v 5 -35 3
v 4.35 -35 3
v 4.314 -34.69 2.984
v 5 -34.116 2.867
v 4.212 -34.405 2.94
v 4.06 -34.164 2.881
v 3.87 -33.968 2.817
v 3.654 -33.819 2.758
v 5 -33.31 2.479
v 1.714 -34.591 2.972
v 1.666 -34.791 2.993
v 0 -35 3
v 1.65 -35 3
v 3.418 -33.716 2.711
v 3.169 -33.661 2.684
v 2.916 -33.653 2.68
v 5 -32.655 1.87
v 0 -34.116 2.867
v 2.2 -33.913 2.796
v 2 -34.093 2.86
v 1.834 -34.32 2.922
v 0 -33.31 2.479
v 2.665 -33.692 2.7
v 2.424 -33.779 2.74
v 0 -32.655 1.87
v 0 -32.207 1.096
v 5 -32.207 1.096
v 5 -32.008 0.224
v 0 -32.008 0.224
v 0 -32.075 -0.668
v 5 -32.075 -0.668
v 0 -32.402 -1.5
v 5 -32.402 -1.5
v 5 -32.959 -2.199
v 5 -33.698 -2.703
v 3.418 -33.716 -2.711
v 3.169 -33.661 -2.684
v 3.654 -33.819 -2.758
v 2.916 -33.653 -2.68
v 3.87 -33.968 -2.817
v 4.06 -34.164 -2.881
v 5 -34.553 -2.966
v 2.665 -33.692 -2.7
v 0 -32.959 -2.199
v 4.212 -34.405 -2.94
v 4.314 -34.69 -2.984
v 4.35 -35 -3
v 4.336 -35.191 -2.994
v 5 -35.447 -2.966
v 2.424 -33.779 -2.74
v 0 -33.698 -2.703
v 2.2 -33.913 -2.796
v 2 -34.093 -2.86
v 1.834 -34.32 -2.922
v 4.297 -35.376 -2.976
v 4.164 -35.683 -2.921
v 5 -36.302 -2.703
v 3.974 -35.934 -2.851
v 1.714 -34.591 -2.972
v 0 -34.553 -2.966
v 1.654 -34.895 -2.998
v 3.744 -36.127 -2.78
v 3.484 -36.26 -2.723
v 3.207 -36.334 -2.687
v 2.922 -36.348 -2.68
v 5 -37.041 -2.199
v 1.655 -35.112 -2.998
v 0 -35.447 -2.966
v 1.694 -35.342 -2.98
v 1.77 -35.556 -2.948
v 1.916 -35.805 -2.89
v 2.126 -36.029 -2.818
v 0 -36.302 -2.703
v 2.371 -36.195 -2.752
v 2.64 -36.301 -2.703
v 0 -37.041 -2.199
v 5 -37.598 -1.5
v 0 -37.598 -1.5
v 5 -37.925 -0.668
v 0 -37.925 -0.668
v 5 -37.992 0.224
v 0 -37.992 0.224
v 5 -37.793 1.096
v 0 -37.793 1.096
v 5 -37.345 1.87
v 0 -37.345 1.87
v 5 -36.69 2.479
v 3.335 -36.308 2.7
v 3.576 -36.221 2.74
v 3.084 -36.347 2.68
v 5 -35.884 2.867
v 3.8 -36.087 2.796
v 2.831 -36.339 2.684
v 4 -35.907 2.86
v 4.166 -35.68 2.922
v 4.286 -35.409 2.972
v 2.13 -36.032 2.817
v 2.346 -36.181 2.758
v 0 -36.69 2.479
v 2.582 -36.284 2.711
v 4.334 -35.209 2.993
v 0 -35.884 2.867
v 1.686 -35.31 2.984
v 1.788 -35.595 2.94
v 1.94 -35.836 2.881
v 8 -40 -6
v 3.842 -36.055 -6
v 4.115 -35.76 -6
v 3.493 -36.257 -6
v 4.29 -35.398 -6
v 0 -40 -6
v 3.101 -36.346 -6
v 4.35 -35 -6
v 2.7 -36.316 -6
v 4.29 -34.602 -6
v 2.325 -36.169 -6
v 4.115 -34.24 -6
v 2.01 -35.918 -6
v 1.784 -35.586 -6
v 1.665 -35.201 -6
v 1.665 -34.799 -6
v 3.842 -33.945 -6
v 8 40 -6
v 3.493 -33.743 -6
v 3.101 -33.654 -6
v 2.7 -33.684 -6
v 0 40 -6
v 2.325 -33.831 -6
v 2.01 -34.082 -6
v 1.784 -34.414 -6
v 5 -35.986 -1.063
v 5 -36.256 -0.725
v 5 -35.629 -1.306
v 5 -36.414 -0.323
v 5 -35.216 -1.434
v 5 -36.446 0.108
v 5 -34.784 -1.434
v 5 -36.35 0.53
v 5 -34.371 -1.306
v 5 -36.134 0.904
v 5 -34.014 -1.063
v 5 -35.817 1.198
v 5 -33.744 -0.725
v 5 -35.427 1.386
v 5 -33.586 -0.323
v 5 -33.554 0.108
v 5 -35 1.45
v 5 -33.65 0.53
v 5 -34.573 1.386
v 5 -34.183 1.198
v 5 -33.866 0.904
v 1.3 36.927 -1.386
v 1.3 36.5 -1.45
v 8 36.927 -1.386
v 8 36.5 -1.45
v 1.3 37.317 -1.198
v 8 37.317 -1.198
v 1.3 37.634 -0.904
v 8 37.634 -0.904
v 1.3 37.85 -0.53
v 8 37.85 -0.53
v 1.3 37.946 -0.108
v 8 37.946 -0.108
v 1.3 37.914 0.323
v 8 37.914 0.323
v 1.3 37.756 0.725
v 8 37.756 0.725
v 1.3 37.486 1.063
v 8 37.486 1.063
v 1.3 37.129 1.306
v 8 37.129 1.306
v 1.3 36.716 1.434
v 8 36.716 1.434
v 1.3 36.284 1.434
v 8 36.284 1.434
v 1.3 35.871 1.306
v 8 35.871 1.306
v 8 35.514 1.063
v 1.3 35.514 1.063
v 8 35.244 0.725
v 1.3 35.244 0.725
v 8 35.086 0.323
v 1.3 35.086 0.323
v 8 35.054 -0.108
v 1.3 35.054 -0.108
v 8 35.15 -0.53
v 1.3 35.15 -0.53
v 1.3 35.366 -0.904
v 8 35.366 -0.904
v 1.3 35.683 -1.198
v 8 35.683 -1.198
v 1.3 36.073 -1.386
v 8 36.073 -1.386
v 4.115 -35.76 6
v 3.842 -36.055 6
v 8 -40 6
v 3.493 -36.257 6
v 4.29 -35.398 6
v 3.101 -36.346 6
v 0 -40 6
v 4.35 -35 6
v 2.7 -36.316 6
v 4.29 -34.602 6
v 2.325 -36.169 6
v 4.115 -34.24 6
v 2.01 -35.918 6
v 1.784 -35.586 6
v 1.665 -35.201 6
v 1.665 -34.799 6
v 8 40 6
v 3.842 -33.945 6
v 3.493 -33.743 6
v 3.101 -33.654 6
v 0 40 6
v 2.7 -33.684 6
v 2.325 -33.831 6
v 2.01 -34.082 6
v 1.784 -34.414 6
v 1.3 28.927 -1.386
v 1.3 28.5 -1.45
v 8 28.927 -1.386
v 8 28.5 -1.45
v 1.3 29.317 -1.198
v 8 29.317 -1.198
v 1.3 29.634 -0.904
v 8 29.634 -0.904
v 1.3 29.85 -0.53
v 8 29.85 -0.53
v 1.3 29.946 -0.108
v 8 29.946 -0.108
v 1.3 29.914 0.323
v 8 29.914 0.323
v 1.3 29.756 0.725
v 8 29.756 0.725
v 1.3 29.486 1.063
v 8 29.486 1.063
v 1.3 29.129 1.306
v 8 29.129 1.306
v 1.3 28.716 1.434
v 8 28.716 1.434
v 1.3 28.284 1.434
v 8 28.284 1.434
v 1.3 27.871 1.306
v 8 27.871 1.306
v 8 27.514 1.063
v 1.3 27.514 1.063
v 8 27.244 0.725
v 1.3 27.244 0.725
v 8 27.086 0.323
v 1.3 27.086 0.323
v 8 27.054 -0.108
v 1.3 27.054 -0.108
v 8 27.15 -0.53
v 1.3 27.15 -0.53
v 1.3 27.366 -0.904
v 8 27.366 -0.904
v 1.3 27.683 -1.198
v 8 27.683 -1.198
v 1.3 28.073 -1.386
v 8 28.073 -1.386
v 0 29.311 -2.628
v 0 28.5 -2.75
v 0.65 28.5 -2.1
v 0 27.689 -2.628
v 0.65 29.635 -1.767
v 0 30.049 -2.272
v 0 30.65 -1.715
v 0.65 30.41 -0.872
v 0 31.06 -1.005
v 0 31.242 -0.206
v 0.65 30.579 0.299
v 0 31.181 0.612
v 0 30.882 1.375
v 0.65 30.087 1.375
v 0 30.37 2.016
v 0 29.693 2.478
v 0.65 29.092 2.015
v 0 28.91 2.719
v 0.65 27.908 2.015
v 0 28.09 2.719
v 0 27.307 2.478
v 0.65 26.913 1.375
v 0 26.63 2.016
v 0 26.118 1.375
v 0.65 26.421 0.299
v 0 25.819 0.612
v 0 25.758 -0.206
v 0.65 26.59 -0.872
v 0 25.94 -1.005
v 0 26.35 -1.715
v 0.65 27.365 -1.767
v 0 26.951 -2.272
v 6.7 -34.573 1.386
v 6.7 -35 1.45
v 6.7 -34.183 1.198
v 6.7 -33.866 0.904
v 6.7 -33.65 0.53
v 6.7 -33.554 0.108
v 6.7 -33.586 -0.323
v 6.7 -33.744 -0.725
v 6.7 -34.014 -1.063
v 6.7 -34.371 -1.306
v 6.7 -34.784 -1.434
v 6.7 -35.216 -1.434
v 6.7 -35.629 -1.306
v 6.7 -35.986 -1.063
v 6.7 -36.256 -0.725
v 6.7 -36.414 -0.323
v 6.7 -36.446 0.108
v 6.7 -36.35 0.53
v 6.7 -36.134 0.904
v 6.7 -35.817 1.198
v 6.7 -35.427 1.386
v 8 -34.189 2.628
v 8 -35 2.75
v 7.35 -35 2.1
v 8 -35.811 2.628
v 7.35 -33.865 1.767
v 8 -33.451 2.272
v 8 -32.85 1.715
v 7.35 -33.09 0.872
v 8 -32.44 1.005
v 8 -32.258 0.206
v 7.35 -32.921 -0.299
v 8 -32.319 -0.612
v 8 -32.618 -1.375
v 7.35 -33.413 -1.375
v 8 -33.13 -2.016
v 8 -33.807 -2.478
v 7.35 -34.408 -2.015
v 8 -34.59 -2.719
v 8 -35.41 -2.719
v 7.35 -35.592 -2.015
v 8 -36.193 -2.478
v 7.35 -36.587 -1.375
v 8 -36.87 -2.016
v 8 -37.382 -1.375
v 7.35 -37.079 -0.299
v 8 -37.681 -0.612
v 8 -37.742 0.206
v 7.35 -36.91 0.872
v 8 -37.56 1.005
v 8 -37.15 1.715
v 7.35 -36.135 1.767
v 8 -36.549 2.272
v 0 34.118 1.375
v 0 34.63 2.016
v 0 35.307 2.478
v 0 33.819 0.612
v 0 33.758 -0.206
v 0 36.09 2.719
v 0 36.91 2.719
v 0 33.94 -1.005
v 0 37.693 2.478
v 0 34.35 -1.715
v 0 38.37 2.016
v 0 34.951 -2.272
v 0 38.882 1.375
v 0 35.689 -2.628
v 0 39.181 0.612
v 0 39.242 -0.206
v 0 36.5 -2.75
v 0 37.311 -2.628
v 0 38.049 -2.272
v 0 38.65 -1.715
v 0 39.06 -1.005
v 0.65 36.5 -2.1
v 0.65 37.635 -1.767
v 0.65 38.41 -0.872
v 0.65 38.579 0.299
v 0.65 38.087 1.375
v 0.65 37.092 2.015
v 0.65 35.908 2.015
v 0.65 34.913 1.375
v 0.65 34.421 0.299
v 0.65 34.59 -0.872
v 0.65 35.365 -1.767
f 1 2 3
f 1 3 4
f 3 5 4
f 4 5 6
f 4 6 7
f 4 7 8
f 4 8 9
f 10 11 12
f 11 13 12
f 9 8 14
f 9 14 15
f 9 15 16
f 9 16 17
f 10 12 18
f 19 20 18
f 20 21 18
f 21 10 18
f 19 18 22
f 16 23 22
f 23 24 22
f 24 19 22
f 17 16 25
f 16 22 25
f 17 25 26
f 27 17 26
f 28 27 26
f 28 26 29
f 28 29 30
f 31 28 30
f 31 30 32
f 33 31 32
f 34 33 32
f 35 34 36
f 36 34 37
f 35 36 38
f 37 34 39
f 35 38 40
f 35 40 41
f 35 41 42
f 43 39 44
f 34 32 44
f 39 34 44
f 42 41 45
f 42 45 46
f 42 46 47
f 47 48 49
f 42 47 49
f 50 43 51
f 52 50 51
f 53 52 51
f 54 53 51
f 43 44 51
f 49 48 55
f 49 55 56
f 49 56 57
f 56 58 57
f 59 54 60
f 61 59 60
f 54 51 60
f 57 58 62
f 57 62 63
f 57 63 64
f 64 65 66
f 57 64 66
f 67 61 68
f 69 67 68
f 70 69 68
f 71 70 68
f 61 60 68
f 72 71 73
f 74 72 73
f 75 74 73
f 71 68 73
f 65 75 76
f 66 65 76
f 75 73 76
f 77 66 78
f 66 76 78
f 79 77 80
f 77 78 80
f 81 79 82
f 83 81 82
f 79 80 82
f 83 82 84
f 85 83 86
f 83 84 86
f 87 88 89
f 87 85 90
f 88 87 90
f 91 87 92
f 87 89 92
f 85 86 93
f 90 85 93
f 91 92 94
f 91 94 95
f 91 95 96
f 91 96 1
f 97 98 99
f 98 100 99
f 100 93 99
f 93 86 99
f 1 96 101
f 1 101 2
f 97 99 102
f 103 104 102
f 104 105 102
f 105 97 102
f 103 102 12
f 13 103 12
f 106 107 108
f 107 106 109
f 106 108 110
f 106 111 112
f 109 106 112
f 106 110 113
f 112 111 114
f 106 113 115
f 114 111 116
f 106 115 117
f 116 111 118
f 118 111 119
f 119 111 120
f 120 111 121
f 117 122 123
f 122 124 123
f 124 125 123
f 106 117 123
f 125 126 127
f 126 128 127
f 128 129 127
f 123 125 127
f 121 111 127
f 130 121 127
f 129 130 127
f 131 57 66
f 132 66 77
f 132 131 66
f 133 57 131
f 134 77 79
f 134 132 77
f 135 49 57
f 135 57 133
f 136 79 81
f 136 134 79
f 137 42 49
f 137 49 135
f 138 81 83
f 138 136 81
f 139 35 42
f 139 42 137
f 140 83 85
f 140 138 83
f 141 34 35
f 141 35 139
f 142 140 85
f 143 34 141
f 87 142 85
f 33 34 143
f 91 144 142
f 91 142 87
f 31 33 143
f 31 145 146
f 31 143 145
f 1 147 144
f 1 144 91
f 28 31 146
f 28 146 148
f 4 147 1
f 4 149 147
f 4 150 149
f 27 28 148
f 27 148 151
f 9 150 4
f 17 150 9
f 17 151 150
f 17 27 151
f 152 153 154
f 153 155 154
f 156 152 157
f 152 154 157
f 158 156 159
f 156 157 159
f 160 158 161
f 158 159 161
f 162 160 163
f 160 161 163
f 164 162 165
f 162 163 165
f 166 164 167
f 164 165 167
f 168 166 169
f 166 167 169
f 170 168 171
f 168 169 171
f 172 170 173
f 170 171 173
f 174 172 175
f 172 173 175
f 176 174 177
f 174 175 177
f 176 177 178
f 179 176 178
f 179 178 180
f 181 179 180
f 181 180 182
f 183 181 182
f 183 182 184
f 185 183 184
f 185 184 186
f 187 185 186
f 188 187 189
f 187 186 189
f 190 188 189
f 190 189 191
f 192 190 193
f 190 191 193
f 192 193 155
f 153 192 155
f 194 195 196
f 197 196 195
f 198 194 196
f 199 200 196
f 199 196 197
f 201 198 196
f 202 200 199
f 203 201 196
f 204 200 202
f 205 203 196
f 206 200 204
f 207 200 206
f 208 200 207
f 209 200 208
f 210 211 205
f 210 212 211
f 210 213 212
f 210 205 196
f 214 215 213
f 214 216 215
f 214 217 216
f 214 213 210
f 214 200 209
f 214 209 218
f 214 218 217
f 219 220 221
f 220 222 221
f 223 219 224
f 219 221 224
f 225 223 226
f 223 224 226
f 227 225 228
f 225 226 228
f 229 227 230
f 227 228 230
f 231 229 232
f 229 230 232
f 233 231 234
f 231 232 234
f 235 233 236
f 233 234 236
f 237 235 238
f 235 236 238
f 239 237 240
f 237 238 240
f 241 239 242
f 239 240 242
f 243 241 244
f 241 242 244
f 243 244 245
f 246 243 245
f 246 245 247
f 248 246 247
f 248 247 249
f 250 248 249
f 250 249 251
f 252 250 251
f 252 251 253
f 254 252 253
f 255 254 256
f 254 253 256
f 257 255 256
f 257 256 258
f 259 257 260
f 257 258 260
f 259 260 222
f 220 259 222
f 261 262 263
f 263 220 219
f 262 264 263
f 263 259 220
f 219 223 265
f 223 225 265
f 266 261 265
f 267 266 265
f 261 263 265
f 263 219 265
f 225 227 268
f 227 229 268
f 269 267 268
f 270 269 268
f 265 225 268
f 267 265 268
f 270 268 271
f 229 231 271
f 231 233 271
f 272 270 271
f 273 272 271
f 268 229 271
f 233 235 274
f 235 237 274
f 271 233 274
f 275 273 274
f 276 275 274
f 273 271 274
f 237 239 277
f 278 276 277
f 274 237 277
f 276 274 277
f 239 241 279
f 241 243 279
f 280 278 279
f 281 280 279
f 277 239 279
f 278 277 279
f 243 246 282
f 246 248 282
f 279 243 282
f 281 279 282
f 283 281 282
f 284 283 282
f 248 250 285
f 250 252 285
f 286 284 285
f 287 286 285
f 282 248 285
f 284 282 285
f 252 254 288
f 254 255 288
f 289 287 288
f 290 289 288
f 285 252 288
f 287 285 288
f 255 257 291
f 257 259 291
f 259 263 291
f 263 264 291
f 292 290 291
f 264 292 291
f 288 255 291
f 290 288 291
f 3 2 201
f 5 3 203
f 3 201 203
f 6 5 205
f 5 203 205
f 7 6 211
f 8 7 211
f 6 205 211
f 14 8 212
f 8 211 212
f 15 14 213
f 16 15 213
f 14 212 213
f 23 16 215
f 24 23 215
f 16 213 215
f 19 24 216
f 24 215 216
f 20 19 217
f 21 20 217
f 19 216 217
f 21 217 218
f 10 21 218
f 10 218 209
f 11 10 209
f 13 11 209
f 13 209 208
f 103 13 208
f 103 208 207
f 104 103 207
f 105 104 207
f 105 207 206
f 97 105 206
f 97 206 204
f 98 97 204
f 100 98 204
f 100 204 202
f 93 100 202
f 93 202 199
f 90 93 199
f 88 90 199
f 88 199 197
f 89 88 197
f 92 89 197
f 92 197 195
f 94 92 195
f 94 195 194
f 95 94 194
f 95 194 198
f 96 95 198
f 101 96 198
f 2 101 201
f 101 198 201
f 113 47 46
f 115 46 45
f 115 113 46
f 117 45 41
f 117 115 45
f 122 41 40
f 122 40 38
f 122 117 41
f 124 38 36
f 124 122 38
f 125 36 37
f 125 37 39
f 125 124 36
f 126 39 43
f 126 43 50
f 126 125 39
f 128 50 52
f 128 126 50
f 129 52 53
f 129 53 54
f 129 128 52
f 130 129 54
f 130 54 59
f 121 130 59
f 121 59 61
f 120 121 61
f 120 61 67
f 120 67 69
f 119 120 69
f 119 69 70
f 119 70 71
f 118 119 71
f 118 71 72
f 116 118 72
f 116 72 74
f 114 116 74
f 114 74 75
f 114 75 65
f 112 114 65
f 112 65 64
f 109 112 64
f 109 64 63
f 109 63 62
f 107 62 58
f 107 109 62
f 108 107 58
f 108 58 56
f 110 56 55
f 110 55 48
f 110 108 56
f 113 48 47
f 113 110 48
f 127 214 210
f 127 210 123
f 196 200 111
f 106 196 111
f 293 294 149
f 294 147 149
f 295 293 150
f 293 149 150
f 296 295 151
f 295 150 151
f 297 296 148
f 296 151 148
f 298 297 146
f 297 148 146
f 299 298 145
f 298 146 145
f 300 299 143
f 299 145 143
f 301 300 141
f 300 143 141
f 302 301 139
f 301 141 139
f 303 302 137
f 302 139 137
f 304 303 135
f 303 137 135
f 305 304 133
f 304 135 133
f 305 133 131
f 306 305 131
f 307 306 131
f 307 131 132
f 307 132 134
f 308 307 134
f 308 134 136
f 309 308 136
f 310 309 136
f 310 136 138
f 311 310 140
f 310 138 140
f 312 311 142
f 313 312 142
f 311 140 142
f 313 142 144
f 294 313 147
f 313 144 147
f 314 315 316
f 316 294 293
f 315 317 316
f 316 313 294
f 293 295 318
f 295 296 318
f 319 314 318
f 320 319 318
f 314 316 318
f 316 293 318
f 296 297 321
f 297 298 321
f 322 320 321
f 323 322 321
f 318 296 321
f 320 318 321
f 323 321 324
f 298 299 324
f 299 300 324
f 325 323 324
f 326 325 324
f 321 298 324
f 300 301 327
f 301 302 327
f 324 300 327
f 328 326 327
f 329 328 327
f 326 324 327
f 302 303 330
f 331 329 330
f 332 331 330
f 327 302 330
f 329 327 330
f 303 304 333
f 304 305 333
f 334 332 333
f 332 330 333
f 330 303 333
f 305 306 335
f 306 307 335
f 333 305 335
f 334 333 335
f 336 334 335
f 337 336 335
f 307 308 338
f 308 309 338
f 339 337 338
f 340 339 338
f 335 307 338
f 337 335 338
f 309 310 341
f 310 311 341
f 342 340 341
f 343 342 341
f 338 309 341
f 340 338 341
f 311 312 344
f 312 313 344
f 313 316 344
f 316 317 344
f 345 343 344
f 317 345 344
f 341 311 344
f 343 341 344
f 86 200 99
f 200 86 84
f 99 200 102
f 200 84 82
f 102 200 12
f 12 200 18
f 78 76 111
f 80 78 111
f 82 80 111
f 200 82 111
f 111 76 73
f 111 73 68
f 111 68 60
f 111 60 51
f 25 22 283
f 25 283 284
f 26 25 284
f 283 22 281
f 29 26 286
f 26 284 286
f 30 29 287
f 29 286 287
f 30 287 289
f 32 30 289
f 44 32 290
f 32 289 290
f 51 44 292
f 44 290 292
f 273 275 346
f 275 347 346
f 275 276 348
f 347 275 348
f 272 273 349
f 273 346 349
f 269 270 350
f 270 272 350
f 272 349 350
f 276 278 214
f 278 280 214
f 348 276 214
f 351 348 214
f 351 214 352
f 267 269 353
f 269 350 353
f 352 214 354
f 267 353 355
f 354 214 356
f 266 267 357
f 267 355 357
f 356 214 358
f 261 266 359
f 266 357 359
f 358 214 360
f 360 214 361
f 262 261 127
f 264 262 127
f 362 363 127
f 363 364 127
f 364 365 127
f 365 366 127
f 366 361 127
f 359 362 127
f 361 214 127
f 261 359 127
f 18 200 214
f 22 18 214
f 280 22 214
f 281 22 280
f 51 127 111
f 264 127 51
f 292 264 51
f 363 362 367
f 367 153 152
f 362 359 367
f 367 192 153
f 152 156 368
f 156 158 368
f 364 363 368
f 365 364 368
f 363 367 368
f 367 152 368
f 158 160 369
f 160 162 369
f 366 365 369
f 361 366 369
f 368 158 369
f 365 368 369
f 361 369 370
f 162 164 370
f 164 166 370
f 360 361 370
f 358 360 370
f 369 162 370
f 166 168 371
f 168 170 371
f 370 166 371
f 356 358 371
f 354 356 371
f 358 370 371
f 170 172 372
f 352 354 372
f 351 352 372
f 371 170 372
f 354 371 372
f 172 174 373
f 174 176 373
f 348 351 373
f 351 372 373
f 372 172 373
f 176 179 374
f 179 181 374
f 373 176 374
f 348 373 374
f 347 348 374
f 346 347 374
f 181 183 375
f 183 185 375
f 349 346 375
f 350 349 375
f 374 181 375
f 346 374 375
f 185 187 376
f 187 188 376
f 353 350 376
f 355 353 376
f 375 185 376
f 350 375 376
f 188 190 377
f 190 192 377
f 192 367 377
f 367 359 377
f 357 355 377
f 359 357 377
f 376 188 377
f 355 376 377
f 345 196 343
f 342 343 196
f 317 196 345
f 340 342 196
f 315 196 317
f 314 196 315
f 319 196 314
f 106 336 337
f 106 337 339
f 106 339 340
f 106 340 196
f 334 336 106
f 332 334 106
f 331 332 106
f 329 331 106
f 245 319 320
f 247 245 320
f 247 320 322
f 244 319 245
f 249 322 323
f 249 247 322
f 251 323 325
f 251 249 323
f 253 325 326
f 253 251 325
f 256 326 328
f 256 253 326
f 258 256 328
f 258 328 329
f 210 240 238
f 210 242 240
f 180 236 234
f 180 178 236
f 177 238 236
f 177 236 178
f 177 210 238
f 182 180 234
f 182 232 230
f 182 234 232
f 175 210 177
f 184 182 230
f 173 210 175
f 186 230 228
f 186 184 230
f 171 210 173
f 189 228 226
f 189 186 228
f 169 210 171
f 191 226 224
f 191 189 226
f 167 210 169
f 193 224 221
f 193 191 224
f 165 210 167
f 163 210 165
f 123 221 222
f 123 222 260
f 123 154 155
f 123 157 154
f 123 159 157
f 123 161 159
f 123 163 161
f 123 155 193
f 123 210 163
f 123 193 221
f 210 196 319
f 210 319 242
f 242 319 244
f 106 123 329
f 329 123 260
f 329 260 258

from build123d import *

# Parameters (mm, degrees)
SKETCH_1_W                     = 12
SKETCH_1_H                     = 80
EXTRUDE_1_DEPTH                = 8
SKETCH_2_R                     = 3
CUT_EXTRUDE_1_DEPTH            = 5
HOLE_WIZARD_M2_5_1_D           = 2.9
HOLE_WIZARD_M2_5_1_CSINK_D     = 5.5
HOLE_WIZARD_M2_5_1_CSINK_ANGLE = 90
HOLE_WIZARD_M2_5_2_D           = 2.9
HOLE_WIZARD_M2_5_2_CSINK_D     = 5.5
HOLE_WIZARD_M2_5_2_CSINK_ANGLE = 90
F_1_0MM_2_REACH                = 44.521
F_1_0MM_2_BORE_R               = 1.35


with BuildPart() as part:
    # 草圖1 → 填料-伸長1 (new body)
    with BuildSketch(Plane(origin=(0, 0, 0), x_dir=(0, 0, -1), z_dir=(1, 0, 0))):
        Rectangle(SKETCH_1_W, SKETCH_1_H)
    extrude(amount=EXTRUDE_1_DEPTH)

    # 草圖2 → 除料-伸長1 (cut)
    with BuildSketch(Plane.ZY):
        with Locations((0, -35)):
            Circle(SKETCH_2_R)
    extrude(amount=-CUT_EXTRUDE_1_DEPTH, mode=Mode.SUBTRACT)

    # M2.5 錐坑平頭螺釘的錐孔1 (through all)
    with Locations(Plane(origin=(8, 0, 0), x_dir=(0, 0, -1), z_dir=(1, 0, 0))):
        with Locations((0, -35)):
            CounterSinkHole(HOLE_WIZARD_M2_5_1_D / 2, HOLE_WIZARD_M2_5_1_CSINK_D / 2, counter_sink_angle=HOLE_WIZARD_M2_5_1_CSINK_ANGLE)

    # M2.5 錐坑平頭螺釘的錐孔2 (through all)
    with Locations(Plane.ZY):
        with Locations((0, 36.5), (0, 28.5)):
            CounterSinkHole(HOLE_WIZARD_M2_5_2_D / 2, HOLE_WIZARD_M2_5_2_CSINK_D / 2, counter_sink_angle=HOLE_WIZARD_M2_5_2_CSINK_ANGLE)

    # Ø1.0mm 定位孔2 bore → Ø1.0mm 定位孔2 (cut, up to next)
    with BuildSketch(Plane.XY.offset(6), mode=Mode.PRIVATE) as f_1_0mm_2_sk1:
        with Locations((3, -35)):
            Circle(F_1_0MM_2_BORE_R)
    f_1_0mm_2_tool1 = extrude(f_1_0mm_2_sk1.sketch, amount=-F_1_0MM_2_REACH, mode=Mode.PRIVATE) & part.part
    f_1_0mm_2 = f_1_0mm_2_tool1.solids().sort_by_distance((3, -35, 6))[0]
    add(f_1_0mm_2, mode=Mode.SUBTRACT)

    # 鏡射1: Ø1.0mm 定位孔2 across plane
    add(f_1_0mm_2.mirror(Plane.XY), mode=Mode.SUBTRACT)


solid = part.part
